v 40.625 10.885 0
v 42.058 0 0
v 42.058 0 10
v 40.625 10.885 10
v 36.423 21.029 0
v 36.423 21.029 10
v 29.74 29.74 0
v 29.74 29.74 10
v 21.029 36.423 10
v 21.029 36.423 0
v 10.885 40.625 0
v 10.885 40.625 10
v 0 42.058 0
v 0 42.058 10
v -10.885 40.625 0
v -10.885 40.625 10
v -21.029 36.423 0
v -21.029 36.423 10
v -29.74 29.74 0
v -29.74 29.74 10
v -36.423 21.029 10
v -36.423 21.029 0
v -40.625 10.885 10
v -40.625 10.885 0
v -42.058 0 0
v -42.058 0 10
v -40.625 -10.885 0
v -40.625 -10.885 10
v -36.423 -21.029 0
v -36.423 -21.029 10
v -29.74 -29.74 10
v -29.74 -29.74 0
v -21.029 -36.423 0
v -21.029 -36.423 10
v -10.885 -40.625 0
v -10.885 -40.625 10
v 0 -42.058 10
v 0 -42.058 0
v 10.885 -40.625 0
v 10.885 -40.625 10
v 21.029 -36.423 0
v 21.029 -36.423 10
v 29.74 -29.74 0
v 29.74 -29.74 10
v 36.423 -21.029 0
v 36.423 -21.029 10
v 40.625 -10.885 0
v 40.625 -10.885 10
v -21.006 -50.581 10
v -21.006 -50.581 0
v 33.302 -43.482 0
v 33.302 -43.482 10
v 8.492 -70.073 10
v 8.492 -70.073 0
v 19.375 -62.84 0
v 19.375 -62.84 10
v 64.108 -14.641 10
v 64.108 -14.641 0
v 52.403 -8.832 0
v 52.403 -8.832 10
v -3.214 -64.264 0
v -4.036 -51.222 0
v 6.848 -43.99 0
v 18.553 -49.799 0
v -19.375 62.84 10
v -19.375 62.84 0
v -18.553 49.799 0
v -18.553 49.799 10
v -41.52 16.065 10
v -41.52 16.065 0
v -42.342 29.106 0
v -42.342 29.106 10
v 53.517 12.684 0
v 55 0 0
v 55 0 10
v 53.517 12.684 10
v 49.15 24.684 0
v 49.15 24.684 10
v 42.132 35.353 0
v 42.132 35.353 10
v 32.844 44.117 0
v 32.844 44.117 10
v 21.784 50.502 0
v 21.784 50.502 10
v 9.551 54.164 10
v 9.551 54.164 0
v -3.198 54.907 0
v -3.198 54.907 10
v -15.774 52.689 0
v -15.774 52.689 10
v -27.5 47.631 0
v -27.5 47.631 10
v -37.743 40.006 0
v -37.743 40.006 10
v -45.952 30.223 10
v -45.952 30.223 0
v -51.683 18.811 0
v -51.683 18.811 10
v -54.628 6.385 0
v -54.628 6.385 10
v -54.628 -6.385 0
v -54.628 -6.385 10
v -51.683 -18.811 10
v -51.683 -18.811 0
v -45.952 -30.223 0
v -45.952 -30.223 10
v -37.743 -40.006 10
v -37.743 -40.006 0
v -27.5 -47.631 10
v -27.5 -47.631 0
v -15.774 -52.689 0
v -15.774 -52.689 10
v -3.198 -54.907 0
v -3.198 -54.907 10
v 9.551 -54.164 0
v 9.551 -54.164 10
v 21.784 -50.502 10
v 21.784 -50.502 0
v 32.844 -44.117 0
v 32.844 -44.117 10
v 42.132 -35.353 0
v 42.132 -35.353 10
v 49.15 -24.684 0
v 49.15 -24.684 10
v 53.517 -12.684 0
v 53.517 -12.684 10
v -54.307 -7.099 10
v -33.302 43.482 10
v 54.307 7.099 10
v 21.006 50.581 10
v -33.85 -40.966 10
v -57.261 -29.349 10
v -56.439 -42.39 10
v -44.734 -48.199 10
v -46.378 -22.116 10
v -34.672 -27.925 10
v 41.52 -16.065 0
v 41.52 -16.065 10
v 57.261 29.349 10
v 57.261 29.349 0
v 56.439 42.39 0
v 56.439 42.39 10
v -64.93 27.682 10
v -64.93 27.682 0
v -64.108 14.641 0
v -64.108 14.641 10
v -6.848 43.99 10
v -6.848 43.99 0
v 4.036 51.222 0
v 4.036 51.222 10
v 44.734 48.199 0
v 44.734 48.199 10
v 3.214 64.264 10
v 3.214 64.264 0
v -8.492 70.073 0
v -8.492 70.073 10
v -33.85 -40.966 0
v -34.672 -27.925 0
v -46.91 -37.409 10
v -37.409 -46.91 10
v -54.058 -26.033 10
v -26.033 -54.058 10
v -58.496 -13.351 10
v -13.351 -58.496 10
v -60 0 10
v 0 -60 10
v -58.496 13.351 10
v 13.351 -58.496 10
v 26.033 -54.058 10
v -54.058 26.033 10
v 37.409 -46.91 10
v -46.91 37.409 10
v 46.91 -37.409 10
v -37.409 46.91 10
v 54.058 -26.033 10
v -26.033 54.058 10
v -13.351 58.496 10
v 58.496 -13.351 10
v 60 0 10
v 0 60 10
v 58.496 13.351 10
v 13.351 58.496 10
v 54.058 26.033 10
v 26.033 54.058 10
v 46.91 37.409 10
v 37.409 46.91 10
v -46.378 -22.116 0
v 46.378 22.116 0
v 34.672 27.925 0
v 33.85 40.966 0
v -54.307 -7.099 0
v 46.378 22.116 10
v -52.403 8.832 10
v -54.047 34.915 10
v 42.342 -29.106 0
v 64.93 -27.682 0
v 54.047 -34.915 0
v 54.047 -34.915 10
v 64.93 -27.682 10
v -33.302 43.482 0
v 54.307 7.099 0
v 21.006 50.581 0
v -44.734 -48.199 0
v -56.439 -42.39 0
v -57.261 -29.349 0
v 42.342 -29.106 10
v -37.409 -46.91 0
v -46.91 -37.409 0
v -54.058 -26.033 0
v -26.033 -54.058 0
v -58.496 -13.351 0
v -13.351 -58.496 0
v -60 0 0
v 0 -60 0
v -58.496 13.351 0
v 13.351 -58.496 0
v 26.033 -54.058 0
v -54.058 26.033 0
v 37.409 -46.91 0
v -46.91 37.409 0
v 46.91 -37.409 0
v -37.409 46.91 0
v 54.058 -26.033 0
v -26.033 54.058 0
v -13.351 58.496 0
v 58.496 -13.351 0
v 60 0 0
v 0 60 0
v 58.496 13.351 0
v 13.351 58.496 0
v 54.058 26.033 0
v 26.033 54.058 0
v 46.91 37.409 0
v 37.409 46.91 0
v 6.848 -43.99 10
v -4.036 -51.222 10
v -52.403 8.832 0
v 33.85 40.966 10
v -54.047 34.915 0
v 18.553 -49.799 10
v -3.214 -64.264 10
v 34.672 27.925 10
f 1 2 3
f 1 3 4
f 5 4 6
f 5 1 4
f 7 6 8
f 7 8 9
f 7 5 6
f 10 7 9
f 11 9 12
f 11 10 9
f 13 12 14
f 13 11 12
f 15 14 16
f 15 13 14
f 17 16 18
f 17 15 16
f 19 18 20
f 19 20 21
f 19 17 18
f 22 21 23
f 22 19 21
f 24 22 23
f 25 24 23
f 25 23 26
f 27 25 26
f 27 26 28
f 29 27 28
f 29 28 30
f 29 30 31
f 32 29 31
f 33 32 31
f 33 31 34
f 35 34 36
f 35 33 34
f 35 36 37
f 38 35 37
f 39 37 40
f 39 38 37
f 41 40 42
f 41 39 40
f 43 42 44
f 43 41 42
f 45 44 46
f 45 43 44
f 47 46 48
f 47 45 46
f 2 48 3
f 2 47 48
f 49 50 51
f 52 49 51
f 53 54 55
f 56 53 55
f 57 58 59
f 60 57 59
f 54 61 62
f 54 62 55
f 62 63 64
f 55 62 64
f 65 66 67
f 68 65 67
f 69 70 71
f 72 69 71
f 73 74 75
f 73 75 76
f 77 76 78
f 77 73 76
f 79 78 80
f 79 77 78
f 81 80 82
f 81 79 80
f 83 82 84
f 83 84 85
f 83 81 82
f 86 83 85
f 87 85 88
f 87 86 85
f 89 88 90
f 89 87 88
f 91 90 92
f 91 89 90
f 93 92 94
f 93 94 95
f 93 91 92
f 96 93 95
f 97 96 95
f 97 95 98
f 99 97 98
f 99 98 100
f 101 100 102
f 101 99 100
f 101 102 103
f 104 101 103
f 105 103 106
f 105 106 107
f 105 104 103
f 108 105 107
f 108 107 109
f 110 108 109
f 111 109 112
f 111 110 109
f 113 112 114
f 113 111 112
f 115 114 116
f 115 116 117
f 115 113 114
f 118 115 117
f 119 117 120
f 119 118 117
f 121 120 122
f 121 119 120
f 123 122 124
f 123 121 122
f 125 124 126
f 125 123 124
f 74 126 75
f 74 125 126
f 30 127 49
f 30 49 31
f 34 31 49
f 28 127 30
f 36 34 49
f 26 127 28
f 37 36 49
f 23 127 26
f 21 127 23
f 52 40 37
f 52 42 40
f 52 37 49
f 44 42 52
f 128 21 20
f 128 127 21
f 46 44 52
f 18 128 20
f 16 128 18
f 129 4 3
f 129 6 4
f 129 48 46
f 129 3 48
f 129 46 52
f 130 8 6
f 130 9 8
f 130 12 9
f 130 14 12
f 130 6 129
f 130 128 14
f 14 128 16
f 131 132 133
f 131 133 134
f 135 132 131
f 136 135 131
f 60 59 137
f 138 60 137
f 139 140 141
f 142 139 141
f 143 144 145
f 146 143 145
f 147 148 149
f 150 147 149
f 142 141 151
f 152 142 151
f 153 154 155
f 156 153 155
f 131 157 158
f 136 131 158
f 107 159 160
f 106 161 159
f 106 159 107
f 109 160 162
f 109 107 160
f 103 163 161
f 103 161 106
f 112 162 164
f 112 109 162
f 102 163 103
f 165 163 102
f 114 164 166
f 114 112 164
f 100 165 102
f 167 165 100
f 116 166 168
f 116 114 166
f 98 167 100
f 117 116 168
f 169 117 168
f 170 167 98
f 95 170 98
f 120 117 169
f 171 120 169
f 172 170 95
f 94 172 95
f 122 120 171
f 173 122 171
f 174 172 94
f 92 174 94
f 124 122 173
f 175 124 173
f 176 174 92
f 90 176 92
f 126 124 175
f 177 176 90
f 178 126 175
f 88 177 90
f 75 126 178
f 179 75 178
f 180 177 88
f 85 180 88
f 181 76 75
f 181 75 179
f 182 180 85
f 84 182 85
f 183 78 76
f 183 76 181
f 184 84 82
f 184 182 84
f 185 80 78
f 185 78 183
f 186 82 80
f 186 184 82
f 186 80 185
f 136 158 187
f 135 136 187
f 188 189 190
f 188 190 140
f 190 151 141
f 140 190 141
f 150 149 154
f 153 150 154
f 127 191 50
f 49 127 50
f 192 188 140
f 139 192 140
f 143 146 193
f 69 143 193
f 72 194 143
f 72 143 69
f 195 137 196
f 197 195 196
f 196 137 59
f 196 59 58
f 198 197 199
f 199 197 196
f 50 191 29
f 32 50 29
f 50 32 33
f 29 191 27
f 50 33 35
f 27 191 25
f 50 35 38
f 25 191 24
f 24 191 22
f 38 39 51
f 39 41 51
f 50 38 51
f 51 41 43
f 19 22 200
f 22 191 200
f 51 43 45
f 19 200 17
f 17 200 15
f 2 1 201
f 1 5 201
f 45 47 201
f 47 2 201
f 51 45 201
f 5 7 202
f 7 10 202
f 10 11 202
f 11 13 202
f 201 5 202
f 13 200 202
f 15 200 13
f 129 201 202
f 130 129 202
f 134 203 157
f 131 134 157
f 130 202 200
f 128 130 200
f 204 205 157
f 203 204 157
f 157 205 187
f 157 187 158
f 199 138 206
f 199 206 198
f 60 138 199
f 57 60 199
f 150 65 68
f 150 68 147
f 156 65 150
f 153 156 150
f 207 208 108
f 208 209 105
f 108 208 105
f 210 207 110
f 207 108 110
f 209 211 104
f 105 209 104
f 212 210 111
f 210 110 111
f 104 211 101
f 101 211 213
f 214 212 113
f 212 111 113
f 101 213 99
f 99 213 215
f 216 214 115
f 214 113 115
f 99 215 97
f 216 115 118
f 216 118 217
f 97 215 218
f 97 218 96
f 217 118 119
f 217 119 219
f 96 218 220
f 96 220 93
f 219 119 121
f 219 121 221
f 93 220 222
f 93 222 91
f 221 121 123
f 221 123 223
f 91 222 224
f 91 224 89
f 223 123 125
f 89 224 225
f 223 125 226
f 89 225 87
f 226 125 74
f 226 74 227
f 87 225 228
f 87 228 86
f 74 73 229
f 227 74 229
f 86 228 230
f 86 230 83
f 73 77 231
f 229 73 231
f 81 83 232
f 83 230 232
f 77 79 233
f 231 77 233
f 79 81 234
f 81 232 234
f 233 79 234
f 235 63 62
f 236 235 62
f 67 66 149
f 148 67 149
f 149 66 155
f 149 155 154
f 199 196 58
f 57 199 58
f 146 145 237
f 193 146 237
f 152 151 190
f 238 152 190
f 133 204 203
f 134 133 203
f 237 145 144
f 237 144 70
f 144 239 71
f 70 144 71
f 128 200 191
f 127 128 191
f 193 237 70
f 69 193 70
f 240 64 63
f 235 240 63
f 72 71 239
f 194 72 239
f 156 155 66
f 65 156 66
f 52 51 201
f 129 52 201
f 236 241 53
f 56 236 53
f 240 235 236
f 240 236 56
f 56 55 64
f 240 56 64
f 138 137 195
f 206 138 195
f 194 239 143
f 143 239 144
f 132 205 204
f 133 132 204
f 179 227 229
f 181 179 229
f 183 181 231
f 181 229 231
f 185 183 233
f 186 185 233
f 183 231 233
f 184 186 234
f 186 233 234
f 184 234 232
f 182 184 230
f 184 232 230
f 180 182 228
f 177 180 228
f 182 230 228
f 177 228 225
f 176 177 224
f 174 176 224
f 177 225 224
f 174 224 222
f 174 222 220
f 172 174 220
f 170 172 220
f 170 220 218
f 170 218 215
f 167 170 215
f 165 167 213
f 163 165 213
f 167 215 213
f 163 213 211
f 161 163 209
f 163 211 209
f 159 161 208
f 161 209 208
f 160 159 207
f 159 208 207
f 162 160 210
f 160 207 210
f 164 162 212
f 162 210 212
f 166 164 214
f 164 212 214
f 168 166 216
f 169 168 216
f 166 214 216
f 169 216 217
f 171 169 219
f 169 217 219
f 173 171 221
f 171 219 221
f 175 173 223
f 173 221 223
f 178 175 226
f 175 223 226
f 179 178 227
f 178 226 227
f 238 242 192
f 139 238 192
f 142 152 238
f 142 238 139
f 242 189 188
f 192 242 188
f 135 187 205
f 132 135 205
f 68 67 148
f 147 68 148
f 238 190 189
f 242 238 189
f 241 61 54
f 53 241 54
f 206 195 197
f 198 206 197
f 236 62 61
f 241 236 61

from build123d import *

# Parameters (mm, degrees)
F0_R     = 60
F1_DEPTH = 10
F2_R     = 55
F3_DEPTH = 10
F5_DEPTH = 10
F6_R     = 42.058051
F7_DEPTH = 10
F9_DEPTH = 10


with BuildPart() as f1:
    # F0 (on Top) → F1 (new body)
    with BuildSketch(Plane.XY):
        Circle(F0_R)
    extrude(amount=F1_DEPTH)

    # F2 (on Top) → F3 (cut)
    with BuildSketch(Plane.XY):
        Circle(F2_R)
    extrude(amount=F3_DEPTH, mode=Mode.SUBTRACT)


with BuildPart() as f5:
    # F4 (on Top) → F5 (new body)
    with BuildSketch(Plane.XY):
        Polygon((54.307408, 7.099115), (21.00569, 50.581153), (-33.301718, 43.482038), (-54.307408, -7.099115), (-21.00569, -50.581153), (33.301718, -43.482038), align=None)
    extrude(amount=F5_DEPTH)

    # F6 (on Top) → F7 (cut)
    with BuildSketch(Plane.XY):
        Circle(F6_R)
    extrude(amount=F7_DEPTH, mode=Mode.SUBTRACT)


with BuildPart() as f9:
    # F8 (on Top) → F9 (new body)
    with BuildSketch(Plane.XY):
        Polygon((-54.047268, 34.914856), (-64.930424, 27.682286), (-64.108413, 14.640911), (-52.403246, 8.832106), (-41.520089, 16.064676), (-42.3421, 29.106051), align=None)
        Polygon((-57.260786, -29.348879), (-56.438775, -42.390254), (-44.733607, -48.199059), (-33.850451, -40.966489), (-34.672462, -27.925114), (-46.377629, -22.116309), align=None)
        Polygon((-3.213518, -64.263735), (8.491649, -70.07254), (19.374806, -62.83997), (18.552795, -49.798595), (6.847627, -43.98979), (-4.035529, -51.22236), align=None)
        Polygon((54.047268, -34.914856), (64.930424, -27.682286), (64.108413, -14.640911), (52.403246, -8.832106), (41.520089, -16.064676), (42.3421, -29.106051), align=None)
        Polygon((57.260786, 29.348879), (56.438775, 42.390254), (44.733607, 48.199059), (33.850451, 40.966489), (34.672462, 27.925114), (46.377629, 22.116309), align=None)
        Polygon((3.213518, 64.263735), (-8.491649, 70.07254), (-19.374806, 62.83997), (-18.552795, 49.798595), (-6.847627, 43.98979), (4.035529, 51.22236), align=None)
    extrude(amount=F9_DEPTH)


solid = Compound([f1.part, f5.part, f9.part])
